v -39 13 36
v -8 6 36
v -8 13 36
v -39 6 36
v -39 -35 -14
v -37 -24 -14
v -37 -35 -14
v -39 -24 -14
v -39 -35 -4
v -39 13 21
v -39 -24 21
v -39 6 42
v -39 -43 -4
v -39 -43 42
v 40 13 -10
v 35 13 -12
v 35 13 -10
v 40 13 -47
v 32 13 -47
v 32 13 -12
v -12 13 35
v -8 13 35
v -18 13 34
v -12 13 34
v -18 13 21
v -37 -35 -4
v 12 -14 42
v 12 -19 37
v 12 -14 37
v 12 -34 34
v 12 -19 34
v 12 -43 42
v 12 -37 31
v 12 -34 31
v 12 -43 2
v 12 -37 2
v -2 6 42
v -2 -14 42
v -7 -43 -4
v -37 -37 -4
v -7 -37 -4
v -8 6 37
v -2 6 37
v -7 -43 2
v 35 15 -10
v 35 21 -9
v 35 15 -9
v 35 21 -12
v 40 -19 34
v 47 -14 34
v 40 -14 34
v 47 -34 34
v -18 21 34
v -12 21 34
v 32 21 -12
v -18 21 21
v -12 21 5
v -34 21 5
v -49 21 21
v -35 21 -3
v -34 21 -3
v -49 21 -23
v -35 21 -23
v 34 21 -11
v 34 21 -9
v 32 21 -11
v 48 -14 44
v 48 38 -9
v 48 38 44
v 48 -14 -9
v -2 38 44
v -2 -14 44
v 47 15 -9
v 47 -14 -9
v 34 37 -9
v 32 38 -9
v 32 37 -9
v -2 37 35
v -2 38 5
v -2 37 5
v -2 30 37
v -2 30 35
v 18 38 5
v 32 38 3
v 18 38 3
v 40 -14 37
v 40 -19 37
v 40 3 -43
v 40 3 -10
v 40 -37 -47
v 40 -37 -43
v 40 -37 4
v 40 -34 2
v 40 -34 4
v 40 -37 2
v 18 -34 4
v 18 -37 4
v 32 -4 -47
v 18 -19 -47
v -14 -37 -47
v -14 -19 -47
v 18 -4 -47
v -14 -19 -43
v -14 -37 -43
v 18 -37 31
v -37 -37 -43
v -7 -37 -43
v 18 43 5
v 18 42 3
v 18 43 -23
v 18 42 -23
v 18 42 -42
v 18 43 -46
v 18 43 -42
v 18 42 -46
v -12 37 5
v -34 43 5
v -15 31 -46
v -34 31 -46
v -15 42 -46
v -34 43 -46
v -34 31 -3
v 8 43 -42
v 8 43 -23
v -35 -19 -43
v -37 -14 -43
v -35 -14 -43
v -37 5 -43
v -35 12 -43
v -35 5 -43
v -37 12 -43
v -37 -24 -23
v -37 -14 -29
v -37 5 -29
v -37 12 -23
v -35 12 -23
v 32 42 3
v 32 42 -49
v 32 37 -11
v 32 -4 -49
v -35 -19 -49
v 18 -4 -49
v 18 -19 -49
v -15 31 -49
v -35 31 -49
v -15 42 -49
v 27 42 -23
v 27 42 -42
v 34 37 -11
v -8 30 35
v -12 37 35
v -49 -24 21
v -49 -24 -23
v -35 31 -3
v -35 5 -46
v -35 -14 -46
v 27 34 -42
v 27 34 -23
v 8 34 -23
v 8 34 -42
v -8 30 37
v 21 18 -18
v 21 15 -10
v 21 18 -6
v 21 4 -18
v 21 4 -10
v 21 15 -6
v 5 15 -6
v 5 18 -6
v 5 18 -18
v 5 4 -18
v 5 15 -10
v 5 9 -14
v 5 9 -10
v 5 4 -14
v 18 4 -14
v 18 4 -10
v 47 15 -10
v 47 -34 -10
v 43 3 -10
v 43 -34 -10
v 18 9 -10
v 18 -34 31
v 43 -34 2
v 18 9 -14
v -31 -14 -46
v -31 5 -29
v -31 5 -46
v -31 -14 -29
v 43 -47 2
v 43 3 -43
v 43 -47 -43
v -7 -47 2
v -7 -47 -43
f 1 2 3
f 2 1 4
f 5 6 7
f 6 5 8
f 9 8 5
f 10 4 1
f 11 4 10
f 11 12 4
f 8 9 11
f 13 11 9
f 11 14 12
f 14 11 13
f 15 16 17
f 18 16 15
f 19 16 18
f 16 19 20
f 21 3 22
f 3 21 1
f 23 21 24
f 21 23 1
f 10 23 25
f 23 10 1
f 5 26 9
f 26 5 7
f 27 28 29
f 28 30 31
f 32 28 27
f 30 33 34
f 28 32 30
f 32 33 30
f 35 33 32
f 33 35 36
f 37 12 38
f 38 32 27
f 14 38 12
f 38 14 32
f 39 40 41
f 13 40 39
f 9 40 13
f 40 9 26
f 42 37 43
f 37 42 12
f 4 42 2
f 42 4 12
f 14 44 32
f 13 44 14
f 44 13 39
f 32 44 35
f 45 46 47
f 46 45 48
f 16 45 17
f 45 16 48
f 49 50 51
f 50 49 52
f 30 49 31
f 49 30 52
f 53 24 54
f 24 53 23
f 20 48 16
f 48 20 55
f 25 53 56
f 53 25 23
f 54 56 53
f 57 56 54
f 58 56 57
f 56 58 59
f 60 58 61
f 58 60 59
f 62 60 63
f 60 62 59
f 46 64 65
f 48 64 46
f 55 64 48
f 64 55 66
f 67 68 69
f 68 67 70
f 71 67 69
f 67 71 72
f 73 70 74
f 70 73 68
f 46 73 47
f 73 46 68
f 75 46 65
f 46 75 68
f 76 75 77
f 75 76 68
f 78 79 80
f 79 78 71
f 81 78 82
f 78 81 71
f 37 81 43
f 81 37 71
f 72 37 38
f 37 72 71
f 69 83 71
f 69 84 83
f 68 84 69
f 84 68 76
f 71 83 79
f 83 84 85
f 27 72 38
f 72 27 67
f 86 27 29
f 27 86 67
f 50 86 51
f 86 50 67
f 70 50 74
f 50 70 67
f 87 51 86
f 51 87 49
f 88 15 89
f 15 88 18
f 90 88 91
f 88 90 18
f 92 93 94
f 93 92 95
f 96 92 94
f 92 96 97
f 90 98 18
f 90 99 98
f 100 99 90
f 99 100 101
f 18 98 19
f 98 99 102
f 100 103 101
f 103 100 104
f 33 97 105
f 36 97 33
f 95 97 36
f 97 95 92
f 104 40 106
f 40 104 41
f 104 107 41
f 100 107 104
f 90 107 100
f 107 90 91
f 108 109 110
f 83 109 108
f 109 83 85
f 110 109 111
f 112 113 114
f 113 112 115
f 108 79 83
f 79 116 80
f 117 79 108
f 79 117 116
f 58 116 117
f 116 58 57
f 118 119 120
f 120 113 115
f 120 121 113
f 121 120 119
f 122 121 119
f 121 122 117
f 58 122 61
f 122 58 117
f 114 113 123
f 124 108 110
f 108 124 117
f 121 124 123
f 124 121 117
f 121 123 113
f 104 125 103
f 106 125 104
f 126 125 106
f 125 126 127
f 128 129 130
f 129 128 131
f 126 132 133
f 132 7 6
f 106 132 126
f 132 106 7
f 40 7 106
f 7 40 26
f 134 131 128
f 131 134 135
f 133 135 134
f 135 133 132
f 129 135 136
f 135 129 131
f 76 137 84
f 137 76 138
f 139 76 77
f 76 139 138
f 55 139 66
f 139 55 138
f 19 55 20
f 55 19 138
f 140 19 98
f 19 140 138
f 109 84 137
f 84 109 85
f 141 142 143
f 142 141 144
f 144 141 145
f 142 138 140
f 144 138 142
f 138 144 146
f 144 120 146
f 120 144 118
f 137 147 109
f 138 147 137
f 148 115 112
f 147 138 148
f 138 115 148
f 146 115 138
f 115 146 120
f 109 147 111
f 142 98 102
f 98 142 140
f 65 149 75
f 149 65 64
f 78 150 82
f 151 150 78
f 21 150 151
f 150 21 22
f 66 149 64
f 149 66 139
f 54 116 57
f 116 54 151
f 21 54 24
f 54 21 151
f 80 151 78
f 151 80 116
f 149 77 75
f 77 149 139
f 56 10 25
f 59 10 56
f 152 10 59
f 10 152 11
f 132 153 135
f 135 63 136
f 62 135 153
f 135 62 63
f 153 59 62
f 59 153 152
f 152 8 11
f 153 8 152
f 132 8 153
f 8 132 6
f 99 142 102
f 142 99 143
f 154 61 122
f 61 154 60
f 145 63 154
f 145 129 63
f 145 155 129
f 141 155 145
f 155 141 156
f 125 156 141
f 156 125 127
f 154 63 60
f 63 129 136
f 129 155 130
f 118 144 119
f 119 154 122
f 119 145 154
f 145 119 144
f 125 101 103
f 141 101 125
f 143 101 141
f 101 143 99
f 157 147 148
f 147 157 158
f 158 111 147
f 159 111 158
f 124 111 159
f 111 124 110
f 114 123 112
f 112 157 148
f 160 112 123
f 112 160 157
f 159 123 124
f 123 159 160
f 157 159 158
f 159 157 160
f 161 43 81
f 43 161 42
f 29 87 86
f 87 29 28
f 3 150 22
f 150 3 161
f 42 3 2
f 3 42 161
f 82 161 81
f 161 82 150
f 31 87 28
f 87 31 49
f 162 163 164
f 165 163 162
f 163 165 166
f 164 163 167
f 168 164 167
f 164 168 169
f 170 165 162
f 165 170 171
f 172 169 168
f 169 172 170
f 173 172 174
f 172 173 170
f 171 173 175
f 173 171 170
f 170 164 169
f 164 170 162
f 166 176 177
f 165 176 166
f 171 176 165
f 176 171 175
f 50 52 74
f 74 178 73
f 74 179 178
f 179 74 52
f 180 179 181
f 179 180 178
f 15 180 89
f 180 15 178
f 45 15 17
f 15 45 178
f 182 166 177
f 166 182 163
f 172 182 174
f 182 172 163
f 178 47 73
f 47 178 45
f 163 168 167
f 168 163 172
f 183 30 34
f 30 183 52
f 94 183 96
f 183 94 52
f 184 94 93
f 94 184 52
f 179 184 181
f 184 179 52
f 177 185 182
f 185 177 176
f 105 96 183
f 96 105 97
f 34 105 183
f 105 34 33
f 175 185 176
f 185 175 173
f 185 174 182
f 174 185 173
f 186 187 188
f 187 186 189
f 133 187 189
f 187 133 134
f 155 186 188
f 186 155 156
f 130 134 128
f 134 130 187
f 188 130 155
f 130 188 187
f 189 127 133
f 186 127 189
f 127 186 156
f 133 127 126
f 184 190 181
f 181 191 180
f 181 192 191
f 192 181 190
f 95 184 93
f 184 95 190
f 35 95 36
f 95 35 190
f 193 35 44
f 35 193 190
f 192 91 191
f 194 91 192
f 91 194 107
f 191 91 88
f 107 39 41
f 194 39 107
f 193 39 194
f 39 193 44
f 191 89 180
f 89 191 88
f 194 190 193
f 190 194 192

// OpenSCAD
difference(){union(){
difference(){union(){
difference(){union(){
difference(){union(){
difference(){union(){
translate([-39,-35,-14])	cube([44,48,50]);	
translate([-39,-43,-4])	cube([51,49,46]);	
translate([-18,-24,-12])	cube([53,45,46]);	
translate([-2,-14,-9])	cube([50,52,53]);	
translate([-14,-37,-47])	cube([54,50,51]);	
translate([-34,-5,-46])	cube([52,48,51]);	
translate([-37,-37,-43])	cube([50,49,49]);	
translate([-15,-4,-49])	cube([47,46,52]);	
translate([-12,-7,-11])	cube([46,44,46]);	
translate([-49,-24,-23])	cube([47,45,44]);	}
translate([-41,34,17])	cube([11,9,12]);	}
translate([-35,-19,-49])	cube([53,50,46]);	}
translate([8,34,-42])	cube([19,10,19]);	}
translate([-8,-19,-8])	cube([48,49,45]);	}
translate([5,4,-18])	cube([16,14,12]);	}
translate([-5,-34,-10])	cube([52,49,44]);	}
translate([36,16,-43])	cube([11,14,12]);	}
translate([-26,-37,-14])	cube([44,46,45]);	}
translate([-48,-14,-46])	cube([17,19,17]);	}
translate([-7,-47,-43])	cube([50,50,45]);	
